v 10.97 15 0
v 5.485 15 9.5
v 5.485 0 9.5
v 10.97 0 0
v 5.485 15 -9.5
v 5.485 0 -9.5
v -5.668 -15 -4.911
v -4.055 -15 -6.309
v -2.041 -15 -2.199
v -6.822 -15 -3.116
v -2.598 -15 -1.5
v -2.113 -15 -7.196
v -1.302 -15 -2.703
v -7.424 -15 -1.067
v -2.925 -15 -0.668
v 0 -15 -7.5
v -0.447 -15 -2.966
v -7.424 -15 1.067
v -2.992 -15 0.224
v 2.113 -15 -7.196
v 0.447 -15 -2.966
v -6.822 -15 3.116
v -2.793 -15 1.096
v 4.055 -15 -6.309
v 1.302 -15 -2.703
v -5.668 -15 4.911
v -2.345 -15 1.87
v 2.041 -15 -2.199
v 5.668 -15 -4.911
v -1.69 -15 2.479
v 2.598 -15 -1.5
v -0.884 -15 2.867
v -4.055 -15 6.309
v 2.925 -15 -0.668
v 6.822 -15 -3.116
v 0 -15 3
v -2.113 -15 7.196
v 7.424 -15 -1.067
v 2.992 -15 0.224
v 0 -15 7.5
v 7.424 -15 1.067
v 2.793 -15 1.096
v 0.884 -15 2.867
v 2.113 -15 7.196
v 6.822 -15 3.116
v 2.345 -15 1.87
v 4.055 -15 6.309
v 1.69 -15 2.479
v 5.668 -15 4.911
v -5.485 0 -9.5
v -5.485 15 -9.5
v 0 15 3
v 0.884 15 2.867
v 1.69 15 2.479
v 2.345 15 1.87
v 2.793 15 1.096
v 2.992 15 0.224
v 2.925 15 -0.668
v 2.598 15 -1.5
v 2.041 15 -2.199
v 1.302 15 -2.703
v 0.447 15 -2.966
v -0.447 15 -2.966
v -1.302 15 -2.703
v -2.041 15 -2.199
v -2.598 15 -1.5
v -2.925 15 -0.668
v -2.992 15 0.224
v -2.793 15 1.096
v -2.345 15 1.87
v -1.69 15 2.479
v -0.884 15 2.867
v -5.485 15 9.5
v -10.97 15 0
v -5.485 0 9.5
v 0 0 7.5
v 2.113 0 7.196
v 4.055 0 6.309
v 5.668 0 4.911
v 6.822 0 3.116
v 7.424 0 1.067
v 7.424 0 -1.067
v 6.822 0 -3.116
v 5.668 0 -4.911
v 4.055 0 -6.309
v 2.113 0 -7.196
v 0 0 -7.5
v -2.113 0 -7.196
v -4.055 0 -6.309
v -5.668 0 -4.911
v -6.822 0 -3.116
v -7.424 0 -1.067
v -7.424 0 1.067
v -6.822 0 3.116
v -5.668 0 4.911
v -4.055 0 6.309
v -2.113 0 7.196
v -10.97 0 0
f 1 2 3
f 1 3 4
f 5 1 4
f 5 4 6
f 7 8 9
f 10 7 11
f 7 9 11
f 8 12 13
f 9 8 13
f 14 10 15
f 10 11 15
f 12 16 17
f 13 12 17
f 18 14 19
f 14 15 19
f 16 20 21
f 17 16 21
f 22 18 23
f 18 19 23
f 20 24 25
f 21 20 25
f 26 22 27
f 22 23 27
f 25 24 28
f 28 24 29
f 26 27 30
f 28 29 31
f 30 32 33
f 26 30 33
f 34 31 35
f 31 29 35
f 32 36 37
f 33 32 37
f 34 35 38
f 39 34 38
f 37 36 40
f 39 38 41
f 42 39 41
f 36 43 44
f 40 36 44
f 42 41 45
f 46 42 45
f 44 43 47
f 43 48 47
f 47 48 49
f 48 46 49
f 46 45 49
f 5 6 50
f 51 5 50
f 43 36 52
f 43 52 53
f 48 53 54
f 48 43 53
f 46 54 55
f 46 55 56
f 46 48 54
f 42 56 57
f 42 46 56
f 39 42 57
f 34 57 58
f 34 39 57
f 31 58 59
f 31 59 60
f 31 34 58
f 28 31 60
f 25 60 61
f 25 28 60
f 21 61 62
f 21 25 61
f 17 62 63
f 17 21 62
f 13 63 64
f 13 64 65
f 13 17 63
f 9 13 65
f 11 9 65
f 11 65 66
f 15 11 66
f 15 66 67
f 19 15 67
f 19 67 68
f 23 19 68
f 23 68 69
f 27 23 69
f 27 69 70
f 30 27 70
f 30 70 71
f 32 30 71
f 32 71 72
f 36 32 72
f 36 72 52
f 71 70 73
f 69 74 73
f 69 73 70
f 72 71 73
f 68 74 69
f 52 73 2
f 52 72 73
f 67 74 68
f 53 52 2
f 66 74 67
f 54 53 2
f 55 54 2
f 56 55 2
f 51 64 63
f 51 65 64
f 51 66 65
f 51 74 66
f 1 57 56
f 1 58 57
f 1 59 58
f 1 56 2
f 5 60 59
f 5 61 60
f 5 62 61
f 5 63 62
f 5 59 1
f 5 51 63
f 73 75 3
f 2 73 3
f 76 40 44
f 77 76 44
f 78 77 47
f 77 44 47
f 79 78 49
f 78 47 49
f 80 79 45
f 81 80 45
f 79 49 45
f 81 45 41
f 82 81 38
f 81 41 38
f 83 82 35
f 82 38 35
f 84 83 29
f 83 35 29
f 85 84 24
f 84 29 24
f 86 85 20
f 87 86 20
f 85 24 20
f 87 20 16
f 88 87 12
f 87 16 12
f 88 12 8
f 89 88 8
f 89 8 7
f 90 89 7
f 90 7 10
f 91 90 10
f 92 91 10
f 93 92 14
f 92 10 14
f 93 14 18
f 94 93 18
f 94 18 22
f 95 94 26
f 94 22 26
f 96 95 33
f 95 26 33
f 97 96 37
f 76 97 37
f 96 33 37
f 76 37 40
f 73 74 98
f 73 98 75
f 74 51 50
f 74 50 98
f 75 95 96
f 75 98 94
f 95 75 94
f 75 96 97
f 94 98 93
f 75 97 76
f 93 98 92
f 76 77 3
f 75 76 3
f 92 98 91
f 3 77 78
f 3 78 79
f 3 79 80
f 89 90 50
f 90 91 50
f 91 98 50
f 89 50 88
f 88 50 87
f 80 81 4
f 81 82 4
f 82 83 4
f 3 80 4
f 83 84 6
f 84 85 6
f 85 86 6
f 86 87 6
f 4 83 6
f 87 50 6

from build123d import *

# Parameters (mm, degrees)
SZKIC1_R                    = 7.5
SZKIC1_R_2                  = 3
DODANIE_WYCI_GNI_CIE1_DEPTH = 15
DODANIE_WYCI_GNI_CIE2_START = -15
SZKIC1_3_R                  = 7.5
SZKIC1_3_R_2                = 3
DODANIE_WYCI_GNI_CIE2_DEPTH = 15


with BuildPart() as part:
    # Szkic1 → Dodanie-wyciągnięcie1 (new body)
    # profile 1 of 2: a face of its own
    with BuildSketch(Plane(origin=(0, 0, 0), x_dir=(1, 0, 0), z_dir=(0, 1, 0))):
        Polygon((-5.484827557, -9.5), (5.484827557, -9.5), (10.969655115, 0), (5.484827557, 9.5), (-5.484827557, 9.5), (-10.969655115, 0), align=None)
        Circle(SZKIC1_R, mode=Mode.SUBTRACT)
    # profile 2 of 2: a face of its own
    with BuildSketch(Plane(origin=(0, 0, 0), x_dir=(1, 0, 0), z_dir=(0, 1, 0))):
        Circle(SZKIC1_R)
        with Locations(Location((0, 0, 0), (0, 0, 270))):
            Circle(SZKIC1_R_2, mode=Mode.SUBTRACT)
    extrude(amount=DODANIE_WYCI_GNI_CIE1_DEPTH)

    # Szkic1<3> → Dodanie-wyciągnięcie2 (add)
    with BuildSketch(Plane(origin=(0, 0, 0), x_dir=(1, 0, 0), z_dir=(0, 1, 0)).offset(DODANIE_WYCI_GNI_CIE2_START)):
        with Locations(Location((0, 0, 0), (0, 0, 270))):
            Circle(SZKIC1_3_R)
        with Locations(Location((0, 0, 0), (0, 0, 270))):
            Circle(SZKIC1_3_R_2, mode=Mode.SUBTRACT)
    extrude(amount=DODANIE_WYCI_GNI_CIE2_DEPTH)


solid = part.part
